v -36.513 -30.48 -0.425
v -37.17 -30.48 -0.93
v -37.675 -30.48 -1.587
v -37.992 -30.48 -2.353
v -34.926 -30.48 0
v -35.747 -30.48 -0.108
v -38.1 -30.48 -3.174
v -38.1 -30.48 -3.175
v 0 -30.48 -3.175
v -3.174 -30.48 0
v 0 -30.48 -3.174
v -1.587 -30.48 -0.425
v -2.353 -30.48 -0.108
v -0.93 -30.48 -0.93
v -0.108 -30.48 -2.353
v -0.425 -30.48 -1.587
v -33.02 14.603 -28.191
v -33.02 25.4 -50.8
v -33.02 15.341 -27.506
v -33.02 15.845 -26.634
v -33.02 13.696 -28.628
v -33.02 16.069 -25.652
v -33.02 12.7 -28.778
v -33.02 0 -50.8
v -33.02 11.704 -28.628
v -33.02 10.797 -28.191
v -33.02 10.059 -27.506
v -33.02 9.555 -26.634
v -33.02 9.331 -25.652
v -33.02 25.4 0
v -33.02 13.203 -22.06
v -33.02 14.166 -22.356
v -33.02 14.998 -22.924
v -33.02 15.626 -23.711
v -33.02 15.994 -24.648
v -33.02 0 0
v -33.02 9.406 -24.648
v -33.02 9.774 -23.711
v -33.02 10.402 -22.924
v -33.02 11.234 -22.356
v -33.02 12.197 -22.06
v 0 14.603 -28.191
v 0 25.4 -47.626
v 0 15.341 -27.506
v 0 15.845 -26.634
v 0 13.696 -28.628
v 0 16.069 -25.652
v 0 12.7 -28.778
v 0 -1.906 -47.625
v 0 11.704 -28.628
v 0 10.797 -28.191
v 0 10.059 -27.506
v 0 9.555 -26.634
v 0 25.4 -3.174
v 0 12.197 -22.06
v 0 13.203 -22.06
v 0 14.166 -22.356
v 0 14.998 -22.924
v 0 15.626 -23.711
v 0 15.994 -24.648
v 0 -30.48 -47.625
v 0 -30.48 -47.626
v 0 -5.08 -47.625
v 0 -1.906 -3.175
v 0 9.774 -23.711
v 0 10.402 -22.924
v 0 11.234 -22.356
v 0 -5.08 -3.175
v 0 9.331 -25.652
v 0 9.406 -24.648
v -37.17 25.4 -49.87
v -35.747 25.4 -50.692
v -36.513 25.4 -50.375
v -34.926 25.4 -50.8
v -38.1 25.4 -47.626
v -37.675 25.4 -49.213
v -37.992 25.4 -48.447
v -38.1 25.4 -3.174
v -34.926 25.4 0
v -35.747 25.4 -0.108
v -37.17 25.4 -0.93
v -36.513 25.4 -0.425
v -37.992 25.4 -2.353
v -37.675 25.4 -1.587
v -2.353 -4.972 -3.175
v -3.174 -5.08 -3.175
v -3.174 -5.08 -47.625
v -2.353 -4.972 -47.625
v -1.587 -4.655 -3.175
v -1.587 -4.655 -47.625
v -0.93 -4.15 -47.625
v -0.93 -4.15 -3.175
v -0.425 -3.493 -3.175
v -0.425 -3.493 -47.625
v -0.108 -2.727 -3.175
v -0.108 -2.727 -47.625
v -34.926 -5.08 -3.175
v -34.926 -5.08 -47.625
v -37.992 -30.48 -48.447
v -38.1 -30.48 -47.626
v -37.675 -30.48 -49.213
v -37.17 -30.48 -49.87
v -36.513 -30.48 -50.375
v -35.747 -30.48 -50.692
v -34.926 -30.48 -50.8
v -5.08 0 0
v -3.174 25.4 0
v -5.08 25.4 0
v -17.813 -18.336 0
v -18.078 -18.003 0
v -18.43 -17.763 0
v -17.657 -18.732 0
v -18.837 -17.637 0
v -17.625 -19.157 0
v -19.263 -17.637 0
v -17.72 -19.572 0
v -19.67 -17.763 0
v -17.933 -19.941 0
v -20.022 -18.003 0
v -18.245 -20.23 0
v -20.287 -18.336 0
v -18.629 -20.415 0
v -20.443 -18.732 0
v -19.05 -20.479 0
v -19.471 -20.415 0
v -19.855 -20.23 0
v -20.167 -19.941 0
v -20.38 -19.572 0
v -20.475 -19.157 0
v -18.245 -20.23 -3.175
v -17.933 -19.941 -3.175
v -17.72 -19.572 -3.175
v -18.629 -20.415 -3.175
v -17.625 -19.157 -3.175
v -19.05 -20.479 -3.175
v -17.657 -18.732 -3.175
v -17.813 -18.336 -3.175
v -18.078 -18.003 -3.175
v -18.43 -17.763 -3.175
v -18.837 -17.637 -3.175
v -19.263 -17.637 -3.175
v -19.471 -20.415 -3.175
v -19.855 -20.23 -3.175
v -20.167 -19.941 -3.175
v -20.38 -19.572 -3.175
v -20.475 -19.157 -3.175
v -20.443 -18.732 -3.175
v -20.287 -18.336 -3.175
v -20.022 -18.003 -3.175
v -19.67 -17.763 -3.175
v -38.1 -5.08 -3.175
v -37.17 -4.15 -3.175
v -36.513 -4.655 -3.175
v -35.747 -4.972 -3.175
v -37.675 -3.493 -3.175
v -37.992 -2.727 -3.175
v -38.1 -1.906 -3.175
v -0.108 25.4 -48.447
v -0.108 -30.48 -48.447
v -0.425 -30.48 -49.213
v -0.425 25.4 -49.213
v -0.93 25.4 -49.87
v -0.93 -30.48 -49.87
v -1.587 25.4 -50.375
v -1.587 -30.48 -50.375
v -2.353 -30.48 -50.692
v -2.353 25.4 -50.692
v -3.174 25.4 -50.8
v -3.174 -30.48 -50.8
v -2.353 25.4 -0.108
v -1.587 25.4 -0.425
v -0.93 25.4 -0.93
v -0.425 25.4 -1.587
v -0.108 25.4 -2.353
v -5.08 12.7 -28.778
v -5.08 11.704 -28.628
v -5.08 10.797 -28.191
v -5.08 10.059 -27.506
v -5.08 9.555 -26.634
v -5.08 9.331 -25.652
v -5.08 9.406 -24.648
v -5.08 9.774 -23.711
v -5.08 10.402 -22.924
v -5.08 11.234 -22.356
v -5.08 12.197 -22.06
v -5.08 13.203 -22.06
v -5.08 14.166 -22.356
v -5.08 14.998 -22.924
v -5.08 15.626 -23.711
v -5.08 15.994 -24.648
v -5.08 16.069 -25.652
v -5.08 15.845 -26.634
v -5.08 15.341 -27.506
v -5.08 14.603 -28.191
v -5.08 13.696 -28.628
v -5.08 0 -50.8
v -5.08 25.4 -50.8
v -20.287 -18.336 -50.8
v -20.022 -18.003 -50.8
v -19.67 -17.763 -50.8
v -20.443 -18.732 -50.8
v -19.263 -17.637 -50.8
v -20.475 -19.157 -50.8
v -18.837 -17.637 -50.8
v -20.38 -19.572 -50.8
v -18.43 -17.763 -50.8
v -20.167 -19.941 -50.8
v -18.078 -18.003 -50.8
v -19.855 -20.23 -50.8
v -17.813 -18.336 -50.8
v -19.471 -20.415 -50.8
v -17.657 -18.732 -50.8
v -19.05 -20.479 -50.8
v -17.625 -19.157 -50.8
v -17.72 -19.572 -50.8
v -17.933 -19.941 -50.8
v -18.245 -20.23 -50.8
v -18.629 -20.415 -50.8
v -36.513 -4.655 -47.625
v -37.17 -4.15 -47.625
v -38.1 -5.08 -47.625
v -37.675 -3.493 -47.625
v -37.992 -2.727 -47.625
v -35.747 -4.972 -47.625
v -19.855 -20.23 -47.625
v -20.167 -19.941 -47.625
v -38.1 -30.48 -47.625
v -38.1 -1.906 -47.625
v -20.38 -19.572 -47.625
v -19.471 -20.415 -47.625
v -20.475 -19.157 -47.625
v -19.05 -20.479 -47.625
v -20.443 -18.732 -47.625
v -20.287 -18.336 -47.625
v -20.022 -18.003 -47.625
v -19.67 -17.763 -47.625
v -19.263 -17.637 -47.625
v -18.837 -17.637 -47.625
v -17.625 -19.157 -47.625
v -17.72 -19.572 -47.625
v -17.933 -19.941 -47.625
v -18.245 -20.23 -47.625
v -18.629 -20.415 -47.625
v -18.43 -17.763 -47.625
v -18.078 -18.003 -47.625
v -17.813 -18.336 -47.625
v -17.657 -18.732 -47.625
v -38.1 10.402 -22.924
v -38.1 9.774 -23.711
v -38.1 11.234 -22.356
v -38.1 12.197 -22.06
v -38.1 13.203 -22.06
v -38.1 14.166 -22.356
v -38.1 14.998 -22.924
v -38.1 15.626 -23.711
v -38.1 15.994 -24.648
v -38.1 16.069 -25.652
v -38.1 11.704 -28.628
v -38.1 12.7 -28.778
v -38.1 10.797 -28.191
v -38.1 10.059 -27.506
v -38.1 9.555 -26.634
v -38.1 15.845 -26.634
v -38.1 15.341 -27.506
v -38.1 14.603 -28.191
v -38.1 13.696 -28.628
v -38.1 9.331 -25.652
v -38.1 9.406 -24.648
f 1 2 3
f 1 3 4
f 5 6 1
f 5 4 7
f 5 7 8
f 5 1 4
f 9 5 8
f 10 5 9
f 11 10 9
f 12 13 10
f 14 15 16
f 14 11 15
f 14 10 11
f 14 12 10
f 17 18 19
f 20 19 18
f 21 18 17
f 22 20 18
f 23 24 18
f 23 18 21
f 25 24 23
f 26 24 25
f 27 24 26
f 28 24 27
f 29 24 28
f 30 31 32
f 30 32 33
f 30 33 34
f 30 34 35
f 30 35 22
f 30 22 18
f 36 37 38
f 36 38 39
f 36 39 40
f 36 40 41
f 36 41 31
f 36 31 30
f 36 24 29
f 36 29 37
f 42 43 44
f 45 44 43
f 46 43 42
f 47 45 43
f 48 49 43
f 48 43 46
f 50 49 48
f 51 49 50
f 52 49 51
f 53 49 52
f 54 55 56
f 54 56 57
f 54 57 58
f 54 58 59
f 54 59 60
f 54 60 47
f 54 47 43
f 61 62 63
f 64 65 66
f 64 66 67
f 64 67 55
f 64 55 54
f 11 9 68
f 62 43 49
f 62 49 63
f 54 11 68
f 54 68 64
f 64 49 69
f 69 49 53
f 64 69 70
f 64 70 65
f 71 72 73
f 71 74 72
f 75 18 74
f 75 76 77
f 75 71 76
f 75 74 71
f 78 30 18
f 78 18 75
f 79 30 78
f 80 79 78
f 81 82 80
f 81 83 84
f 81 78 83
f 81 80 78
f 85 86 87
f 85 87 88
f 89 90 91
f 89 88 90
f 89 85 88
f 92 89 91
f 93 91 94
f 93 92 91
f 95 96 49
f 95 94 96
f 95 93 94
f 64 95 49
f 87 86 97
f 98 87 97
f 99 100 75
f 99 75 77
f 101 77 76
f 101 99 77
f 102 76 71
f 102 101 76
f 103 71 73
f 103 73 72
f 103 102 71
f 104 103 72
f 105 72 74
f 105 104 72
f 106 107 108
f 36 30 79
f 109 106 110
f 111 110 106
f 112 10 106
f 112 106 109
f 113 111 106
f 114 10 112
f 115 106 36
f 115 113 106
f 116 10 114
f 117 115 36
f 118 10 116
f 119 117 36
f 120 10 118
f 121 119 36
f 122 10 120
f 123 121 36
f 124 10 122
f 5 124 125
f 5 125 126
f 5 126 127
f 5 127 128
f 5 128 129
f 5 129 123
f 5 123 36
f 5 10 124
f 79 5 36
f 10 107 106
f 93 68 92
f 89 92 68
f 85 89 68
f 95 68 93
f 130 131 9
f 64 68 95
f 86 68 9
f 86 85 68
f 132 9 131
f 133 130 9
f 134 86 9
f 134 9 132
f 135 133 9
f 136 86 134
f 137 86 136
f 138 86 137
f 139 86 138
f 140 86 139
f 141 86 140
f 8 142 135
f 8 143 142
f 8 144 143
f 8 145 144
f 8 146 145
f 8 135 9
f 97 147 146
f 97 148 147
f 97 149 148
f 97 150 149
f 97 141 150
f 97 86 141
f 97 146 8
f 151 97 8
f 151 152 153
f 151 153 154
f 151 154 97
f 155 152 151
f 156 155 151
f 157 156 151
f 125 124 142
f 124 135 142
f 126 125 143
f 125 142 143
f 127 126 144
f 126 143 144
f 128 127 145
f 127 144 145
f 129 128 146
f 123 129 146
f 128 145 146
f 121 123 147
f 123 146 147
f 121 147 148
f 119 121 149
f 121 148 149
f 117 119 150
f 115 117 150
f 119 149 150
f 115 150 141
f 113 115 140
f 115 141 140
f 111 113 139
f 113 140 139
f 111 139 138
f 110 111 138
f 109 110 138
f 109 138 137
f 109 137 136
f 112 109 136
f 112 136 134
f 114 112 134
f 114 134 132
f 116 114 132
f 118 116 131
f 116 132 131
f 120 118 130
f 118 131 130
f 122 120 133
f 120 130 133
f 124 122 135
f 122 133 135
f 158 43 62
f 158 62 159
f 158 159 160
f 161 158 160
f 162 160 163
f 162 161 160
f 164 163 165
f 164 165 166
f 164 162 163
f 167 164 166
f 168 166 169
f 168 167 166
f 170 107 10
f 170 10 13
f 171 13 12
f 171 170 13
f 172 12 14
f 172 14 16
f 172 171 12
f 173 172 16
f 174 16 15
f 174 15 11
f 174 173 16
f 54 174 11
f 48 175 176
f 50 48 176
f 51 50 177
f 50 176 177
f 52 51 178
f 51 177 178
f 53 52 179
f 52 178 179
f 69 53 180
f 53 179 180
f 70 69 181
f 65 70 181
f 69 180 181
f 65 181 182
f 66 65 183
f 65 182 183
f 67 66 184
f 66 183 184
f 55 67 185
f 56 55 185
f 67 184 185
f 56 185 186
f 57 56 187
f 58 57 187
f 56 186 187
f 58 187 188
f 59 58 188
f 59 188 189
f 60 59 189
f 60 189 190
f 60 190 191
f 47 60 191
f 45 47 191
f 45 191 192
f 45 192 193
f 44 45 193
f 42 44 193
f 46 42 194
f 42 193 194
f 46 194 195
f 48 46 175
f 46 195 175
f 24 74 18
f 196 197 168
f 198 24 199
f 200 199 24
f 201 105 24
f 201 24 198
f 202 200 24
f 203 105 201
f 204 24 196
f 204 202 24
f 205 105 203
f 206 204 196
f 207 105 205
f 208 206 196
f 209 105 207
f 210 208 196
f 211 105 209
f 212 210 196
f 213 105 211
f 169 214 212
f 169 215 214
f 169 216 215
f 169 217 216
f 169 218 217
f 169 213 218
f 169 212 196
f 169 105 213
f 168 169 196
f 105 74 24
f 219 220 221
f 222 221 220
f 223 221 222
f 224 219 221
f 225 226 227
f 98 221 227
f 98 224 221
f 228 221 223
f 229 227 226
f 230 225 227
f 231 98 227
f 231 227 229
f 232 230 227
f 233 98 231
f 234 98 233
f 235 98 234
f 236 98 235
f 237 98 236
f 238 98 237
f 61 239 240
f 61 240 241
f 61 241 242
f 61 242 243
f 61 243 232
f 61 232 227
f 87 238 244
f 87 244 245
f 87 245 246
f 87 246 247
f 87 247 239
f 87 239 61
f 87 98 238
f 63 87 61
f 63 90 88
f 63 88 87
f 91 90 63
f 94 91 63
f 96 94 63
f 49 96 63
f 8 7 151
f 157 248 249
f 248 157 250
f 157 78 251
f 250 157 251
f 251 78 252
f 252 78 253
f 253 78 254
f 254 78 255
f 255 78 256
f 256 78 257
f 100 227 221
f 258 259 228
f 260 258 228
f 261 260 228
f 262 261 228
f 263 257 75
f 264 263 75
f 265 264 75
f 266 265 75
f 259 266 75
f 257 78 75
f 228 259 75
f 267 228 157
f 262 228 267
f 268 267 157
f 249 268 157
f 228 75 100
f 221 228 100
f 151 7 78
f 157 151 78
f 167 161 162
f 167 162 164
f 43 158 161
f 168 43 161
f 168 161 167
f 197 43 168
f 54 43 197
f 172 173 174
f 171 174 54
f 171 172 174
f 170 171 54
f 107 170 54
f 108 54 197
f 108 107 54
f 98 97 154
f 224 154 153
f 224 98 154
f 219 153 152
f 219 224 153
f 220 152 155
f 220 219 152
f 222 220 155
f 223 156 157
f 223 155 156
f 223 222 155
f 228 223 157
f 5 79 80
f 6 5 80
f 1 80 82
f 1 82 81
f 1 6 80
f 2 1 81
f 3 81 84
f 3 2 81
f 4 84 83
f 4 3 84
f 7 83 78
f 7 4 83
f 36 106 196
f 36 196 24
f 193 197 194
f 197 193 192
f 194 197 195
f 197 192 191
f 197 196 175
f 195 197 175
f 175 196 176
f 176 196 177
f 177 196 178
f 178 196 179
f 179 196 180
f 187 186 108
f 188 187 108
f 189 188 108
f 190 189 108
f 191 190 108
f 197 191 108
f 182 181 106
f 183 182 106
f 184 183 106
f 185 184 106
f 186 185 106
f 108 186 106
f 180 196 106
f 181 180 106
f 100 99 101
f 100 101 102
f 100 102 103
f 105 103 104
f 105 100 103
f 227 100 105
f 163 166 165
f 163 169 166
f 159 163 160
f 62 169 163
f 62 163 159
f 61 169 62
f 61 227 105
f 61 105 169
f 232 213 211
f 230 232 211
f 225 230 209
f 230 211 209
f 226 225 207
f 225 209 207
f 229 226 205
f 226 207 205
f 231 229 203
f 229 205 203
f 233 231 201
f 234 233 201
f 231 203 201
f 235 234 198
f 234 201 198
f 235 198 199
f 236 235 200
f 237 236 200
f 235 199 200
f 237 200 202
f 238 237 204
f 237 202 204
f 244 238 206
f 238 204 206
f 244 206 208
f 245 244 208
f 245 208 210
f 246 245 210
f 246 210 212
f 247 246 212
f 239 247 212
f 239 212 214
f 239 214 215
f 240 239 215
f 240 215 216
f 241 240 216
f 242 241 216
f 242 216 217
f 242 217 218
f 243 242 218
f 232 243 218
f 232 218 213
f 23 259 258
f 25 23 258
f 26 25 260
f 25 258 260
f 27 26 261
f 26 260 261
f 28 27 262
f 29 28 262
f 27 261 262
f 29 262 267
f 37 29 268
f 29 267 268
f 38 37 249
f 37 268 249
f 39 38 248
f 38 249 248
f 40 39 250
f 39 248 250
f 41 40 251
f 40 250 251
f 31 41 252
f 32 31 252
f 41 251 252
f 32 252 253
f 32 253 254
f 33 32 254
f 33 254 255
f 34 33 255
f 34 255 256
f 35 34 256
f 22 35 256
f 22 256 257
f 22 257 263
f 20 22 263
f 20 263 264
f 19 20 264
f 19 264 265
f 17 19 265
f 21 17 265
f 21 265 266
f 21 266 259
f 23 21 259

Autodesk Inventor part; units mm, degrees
ref_plane "YZ Plane" through (0, 0, 0) normal (1, 0, 0) x (0, 1, 0)
ref_plane "XZ Plane" through (0, 0, 0) normal (0, 1, 0) x (-1, 0, 0)
ref_plane "XY Plane" through (0, 0, 0) normal (0, 0, 1) x (1, 0, 0)
sketch "Sketch1" plane through (0, 0, 0) normal (0, 1, 0) x (-1, 0, 0)
  line L0 (0, 0) -> (38.1, 0)
  line L1 (38.1, 0) -> (38.1, -50.8)
  line L2 (38.1, -50.8) -> (0, -50.8)
  line L3 (0, -50.8) -> (0, 0)
  line L4 (38.1, -50.8) -> (33.02, -50.8)
  line L5 (33.02, -50.8) -> (33.02, 0)
  line L6 (33.02, 0) -> (38.1, 0)
  line L7 (38.1, 0) -> (38.1, -50.8)
  line L8 (0, -50.8) -> (5.08, -50.8)
  line L9 (5.08, -50.8) -> (5.08, 0)
  line L10 (5.08, 0) -> (0, 0)
  line L11 (0, 0) -> (0, -50.8)
  dimension "d0" = 38.1
  dimension "d1" = 50.8
  dimension "d2" = 5.08
  dimension "d3" = 5.08
extrude "Extrusion1" add sketch "Sketch1" along normal blind 25.4 contours L0 L9 L2 L3 | L0 L1 L2 L5
extrude "Extrusion2" add sketch "Sketch1" against normal blind 5.08
sketch "Sketch2" plane through (0, 25.4, 0) normal (1, 0, 0) x (0, 0, -1)
  line L0 (50.8, 0) -> (0, 0) projected
  line L1 (25.4, 0) -> (25.4, -12.7)
  point P0 (0, -25.4)
  dimension "d8" = 12.7
hole "Hole1" at (0, 12.7, -25.4) direction (-1, 0, 0) diameter 6.7564 end through all clearance for "Socket Head Cap Screw" size "1/4" standard "Ansi Unified Screw Threads"
sketch "Sketch3" plane through (0, -5.08, 0) normal (0, -1, 0) x (1, 0, 0)
  line L0 (0, -50.8) -> (-5.08, -50.8) projected
  line L1 (0, -50.8) -> (0, -38.1)
  line L2 (0, 0) -> (0, -50.8) projected
  line L3 (0, -38.1) -> (0, -12.7)
  line L4 (0, -38.1) -> (-19.05, -38.1)
  line L5 (0, -12.7) -> (-19.05, -12.7)
  line L6 (-38.1, -50.8) -> (-38.1, 0) projected
  line L7 (0, -39.6875) -> (-38.1, -39.6875)
  line L8 (-38.1, -39.6875) -> (-38.1, -36.5125)
  line L9 (-38.1, -36.5125) -> (0, -36.5125)
  line L10 (0, -36.5125) -> (0, -39.6875)
  line L11 (0, -39.6875) -> (-38.1, -36.5125) construction
  line L12 (-38.1, -39.6875) -> (0, -36.5125) construction
  line L13 (0, -11.1125) -> (-38.1, -11.1125)
  line L14 (-38.1, -11.1125) -> (-38.1, -14.2875)
  line L15 (-38.1, -14.2875) -> (0, -14.2875)
  line L16 (0, -14.2875) -> (0, -11.1125)
  line L17 (0, -11.1125) -> (-38.1, -14.2875) construction
  line L18 (-38.1, -11.1125) -> (0, -14.2875) construction
  line L19 (-38.1, 0) -> (-38.1, -50.8) projected
  line L20 (-38.1, 0) -> (0, 0)
  line L21 (0, 0) -> (0, -3.175)
  line L22 (0, -3.175) -> (-38.1, -3.175)
  line L23 (-38.1, -3.175) -> (-38.1, 0)
  line L24 (0, -50.8) -> (-38.1, -50.8)
  line L25 (-38.1, -50.8) -> (-38.1, -47.625)
  line L26 (-38.1, -47.625) -> (0, -47.625)
  line L27 (0, -47.625) -> (0, -50.8)
  dimension "d16" = 12.7
  dimension "d17" = 25.4
  dimension "d18" = 19.05
  dimension "d19" = 3.175
  dimension "d20" = 3.175
  dimension "d32" = 3.175
  dimension "d33" = 3.175
extrude "Extrusion3" add sketch "Sketch3" along normal blind 25.4 contours L0 L24 L6 L26 L1 | L6 L20 L2 L22
sketch "Sketch4" plane through (-38.1, -5.08, 0) normal (0, 0, 1) x (1, 0, 0)
  line L0 (38.1, -25.4) -> (19.05, -25.4)
  line L1 (19.05, -25.4) -> (19.05, -13.97)
  point P0 (38.1, 5.08)
  dimension "d23" = 11.43
hole "Hole2" at (-19.05, -19.05, 0) direction (0, 0, -1) diameter 2.8575 end through all
fillet "Fillet1" radius 3.175 6 edges at (-38.1, -2.54, 0) (0, -2.54, 0) (0, -2.54, -50.8) (-38.1, -2.54, -50.8) (0, -5.08, -25.4) (-38.1, -5.08, -25.4)
properties part number "Sample Holder end for 8020-thruhole-widestance"
